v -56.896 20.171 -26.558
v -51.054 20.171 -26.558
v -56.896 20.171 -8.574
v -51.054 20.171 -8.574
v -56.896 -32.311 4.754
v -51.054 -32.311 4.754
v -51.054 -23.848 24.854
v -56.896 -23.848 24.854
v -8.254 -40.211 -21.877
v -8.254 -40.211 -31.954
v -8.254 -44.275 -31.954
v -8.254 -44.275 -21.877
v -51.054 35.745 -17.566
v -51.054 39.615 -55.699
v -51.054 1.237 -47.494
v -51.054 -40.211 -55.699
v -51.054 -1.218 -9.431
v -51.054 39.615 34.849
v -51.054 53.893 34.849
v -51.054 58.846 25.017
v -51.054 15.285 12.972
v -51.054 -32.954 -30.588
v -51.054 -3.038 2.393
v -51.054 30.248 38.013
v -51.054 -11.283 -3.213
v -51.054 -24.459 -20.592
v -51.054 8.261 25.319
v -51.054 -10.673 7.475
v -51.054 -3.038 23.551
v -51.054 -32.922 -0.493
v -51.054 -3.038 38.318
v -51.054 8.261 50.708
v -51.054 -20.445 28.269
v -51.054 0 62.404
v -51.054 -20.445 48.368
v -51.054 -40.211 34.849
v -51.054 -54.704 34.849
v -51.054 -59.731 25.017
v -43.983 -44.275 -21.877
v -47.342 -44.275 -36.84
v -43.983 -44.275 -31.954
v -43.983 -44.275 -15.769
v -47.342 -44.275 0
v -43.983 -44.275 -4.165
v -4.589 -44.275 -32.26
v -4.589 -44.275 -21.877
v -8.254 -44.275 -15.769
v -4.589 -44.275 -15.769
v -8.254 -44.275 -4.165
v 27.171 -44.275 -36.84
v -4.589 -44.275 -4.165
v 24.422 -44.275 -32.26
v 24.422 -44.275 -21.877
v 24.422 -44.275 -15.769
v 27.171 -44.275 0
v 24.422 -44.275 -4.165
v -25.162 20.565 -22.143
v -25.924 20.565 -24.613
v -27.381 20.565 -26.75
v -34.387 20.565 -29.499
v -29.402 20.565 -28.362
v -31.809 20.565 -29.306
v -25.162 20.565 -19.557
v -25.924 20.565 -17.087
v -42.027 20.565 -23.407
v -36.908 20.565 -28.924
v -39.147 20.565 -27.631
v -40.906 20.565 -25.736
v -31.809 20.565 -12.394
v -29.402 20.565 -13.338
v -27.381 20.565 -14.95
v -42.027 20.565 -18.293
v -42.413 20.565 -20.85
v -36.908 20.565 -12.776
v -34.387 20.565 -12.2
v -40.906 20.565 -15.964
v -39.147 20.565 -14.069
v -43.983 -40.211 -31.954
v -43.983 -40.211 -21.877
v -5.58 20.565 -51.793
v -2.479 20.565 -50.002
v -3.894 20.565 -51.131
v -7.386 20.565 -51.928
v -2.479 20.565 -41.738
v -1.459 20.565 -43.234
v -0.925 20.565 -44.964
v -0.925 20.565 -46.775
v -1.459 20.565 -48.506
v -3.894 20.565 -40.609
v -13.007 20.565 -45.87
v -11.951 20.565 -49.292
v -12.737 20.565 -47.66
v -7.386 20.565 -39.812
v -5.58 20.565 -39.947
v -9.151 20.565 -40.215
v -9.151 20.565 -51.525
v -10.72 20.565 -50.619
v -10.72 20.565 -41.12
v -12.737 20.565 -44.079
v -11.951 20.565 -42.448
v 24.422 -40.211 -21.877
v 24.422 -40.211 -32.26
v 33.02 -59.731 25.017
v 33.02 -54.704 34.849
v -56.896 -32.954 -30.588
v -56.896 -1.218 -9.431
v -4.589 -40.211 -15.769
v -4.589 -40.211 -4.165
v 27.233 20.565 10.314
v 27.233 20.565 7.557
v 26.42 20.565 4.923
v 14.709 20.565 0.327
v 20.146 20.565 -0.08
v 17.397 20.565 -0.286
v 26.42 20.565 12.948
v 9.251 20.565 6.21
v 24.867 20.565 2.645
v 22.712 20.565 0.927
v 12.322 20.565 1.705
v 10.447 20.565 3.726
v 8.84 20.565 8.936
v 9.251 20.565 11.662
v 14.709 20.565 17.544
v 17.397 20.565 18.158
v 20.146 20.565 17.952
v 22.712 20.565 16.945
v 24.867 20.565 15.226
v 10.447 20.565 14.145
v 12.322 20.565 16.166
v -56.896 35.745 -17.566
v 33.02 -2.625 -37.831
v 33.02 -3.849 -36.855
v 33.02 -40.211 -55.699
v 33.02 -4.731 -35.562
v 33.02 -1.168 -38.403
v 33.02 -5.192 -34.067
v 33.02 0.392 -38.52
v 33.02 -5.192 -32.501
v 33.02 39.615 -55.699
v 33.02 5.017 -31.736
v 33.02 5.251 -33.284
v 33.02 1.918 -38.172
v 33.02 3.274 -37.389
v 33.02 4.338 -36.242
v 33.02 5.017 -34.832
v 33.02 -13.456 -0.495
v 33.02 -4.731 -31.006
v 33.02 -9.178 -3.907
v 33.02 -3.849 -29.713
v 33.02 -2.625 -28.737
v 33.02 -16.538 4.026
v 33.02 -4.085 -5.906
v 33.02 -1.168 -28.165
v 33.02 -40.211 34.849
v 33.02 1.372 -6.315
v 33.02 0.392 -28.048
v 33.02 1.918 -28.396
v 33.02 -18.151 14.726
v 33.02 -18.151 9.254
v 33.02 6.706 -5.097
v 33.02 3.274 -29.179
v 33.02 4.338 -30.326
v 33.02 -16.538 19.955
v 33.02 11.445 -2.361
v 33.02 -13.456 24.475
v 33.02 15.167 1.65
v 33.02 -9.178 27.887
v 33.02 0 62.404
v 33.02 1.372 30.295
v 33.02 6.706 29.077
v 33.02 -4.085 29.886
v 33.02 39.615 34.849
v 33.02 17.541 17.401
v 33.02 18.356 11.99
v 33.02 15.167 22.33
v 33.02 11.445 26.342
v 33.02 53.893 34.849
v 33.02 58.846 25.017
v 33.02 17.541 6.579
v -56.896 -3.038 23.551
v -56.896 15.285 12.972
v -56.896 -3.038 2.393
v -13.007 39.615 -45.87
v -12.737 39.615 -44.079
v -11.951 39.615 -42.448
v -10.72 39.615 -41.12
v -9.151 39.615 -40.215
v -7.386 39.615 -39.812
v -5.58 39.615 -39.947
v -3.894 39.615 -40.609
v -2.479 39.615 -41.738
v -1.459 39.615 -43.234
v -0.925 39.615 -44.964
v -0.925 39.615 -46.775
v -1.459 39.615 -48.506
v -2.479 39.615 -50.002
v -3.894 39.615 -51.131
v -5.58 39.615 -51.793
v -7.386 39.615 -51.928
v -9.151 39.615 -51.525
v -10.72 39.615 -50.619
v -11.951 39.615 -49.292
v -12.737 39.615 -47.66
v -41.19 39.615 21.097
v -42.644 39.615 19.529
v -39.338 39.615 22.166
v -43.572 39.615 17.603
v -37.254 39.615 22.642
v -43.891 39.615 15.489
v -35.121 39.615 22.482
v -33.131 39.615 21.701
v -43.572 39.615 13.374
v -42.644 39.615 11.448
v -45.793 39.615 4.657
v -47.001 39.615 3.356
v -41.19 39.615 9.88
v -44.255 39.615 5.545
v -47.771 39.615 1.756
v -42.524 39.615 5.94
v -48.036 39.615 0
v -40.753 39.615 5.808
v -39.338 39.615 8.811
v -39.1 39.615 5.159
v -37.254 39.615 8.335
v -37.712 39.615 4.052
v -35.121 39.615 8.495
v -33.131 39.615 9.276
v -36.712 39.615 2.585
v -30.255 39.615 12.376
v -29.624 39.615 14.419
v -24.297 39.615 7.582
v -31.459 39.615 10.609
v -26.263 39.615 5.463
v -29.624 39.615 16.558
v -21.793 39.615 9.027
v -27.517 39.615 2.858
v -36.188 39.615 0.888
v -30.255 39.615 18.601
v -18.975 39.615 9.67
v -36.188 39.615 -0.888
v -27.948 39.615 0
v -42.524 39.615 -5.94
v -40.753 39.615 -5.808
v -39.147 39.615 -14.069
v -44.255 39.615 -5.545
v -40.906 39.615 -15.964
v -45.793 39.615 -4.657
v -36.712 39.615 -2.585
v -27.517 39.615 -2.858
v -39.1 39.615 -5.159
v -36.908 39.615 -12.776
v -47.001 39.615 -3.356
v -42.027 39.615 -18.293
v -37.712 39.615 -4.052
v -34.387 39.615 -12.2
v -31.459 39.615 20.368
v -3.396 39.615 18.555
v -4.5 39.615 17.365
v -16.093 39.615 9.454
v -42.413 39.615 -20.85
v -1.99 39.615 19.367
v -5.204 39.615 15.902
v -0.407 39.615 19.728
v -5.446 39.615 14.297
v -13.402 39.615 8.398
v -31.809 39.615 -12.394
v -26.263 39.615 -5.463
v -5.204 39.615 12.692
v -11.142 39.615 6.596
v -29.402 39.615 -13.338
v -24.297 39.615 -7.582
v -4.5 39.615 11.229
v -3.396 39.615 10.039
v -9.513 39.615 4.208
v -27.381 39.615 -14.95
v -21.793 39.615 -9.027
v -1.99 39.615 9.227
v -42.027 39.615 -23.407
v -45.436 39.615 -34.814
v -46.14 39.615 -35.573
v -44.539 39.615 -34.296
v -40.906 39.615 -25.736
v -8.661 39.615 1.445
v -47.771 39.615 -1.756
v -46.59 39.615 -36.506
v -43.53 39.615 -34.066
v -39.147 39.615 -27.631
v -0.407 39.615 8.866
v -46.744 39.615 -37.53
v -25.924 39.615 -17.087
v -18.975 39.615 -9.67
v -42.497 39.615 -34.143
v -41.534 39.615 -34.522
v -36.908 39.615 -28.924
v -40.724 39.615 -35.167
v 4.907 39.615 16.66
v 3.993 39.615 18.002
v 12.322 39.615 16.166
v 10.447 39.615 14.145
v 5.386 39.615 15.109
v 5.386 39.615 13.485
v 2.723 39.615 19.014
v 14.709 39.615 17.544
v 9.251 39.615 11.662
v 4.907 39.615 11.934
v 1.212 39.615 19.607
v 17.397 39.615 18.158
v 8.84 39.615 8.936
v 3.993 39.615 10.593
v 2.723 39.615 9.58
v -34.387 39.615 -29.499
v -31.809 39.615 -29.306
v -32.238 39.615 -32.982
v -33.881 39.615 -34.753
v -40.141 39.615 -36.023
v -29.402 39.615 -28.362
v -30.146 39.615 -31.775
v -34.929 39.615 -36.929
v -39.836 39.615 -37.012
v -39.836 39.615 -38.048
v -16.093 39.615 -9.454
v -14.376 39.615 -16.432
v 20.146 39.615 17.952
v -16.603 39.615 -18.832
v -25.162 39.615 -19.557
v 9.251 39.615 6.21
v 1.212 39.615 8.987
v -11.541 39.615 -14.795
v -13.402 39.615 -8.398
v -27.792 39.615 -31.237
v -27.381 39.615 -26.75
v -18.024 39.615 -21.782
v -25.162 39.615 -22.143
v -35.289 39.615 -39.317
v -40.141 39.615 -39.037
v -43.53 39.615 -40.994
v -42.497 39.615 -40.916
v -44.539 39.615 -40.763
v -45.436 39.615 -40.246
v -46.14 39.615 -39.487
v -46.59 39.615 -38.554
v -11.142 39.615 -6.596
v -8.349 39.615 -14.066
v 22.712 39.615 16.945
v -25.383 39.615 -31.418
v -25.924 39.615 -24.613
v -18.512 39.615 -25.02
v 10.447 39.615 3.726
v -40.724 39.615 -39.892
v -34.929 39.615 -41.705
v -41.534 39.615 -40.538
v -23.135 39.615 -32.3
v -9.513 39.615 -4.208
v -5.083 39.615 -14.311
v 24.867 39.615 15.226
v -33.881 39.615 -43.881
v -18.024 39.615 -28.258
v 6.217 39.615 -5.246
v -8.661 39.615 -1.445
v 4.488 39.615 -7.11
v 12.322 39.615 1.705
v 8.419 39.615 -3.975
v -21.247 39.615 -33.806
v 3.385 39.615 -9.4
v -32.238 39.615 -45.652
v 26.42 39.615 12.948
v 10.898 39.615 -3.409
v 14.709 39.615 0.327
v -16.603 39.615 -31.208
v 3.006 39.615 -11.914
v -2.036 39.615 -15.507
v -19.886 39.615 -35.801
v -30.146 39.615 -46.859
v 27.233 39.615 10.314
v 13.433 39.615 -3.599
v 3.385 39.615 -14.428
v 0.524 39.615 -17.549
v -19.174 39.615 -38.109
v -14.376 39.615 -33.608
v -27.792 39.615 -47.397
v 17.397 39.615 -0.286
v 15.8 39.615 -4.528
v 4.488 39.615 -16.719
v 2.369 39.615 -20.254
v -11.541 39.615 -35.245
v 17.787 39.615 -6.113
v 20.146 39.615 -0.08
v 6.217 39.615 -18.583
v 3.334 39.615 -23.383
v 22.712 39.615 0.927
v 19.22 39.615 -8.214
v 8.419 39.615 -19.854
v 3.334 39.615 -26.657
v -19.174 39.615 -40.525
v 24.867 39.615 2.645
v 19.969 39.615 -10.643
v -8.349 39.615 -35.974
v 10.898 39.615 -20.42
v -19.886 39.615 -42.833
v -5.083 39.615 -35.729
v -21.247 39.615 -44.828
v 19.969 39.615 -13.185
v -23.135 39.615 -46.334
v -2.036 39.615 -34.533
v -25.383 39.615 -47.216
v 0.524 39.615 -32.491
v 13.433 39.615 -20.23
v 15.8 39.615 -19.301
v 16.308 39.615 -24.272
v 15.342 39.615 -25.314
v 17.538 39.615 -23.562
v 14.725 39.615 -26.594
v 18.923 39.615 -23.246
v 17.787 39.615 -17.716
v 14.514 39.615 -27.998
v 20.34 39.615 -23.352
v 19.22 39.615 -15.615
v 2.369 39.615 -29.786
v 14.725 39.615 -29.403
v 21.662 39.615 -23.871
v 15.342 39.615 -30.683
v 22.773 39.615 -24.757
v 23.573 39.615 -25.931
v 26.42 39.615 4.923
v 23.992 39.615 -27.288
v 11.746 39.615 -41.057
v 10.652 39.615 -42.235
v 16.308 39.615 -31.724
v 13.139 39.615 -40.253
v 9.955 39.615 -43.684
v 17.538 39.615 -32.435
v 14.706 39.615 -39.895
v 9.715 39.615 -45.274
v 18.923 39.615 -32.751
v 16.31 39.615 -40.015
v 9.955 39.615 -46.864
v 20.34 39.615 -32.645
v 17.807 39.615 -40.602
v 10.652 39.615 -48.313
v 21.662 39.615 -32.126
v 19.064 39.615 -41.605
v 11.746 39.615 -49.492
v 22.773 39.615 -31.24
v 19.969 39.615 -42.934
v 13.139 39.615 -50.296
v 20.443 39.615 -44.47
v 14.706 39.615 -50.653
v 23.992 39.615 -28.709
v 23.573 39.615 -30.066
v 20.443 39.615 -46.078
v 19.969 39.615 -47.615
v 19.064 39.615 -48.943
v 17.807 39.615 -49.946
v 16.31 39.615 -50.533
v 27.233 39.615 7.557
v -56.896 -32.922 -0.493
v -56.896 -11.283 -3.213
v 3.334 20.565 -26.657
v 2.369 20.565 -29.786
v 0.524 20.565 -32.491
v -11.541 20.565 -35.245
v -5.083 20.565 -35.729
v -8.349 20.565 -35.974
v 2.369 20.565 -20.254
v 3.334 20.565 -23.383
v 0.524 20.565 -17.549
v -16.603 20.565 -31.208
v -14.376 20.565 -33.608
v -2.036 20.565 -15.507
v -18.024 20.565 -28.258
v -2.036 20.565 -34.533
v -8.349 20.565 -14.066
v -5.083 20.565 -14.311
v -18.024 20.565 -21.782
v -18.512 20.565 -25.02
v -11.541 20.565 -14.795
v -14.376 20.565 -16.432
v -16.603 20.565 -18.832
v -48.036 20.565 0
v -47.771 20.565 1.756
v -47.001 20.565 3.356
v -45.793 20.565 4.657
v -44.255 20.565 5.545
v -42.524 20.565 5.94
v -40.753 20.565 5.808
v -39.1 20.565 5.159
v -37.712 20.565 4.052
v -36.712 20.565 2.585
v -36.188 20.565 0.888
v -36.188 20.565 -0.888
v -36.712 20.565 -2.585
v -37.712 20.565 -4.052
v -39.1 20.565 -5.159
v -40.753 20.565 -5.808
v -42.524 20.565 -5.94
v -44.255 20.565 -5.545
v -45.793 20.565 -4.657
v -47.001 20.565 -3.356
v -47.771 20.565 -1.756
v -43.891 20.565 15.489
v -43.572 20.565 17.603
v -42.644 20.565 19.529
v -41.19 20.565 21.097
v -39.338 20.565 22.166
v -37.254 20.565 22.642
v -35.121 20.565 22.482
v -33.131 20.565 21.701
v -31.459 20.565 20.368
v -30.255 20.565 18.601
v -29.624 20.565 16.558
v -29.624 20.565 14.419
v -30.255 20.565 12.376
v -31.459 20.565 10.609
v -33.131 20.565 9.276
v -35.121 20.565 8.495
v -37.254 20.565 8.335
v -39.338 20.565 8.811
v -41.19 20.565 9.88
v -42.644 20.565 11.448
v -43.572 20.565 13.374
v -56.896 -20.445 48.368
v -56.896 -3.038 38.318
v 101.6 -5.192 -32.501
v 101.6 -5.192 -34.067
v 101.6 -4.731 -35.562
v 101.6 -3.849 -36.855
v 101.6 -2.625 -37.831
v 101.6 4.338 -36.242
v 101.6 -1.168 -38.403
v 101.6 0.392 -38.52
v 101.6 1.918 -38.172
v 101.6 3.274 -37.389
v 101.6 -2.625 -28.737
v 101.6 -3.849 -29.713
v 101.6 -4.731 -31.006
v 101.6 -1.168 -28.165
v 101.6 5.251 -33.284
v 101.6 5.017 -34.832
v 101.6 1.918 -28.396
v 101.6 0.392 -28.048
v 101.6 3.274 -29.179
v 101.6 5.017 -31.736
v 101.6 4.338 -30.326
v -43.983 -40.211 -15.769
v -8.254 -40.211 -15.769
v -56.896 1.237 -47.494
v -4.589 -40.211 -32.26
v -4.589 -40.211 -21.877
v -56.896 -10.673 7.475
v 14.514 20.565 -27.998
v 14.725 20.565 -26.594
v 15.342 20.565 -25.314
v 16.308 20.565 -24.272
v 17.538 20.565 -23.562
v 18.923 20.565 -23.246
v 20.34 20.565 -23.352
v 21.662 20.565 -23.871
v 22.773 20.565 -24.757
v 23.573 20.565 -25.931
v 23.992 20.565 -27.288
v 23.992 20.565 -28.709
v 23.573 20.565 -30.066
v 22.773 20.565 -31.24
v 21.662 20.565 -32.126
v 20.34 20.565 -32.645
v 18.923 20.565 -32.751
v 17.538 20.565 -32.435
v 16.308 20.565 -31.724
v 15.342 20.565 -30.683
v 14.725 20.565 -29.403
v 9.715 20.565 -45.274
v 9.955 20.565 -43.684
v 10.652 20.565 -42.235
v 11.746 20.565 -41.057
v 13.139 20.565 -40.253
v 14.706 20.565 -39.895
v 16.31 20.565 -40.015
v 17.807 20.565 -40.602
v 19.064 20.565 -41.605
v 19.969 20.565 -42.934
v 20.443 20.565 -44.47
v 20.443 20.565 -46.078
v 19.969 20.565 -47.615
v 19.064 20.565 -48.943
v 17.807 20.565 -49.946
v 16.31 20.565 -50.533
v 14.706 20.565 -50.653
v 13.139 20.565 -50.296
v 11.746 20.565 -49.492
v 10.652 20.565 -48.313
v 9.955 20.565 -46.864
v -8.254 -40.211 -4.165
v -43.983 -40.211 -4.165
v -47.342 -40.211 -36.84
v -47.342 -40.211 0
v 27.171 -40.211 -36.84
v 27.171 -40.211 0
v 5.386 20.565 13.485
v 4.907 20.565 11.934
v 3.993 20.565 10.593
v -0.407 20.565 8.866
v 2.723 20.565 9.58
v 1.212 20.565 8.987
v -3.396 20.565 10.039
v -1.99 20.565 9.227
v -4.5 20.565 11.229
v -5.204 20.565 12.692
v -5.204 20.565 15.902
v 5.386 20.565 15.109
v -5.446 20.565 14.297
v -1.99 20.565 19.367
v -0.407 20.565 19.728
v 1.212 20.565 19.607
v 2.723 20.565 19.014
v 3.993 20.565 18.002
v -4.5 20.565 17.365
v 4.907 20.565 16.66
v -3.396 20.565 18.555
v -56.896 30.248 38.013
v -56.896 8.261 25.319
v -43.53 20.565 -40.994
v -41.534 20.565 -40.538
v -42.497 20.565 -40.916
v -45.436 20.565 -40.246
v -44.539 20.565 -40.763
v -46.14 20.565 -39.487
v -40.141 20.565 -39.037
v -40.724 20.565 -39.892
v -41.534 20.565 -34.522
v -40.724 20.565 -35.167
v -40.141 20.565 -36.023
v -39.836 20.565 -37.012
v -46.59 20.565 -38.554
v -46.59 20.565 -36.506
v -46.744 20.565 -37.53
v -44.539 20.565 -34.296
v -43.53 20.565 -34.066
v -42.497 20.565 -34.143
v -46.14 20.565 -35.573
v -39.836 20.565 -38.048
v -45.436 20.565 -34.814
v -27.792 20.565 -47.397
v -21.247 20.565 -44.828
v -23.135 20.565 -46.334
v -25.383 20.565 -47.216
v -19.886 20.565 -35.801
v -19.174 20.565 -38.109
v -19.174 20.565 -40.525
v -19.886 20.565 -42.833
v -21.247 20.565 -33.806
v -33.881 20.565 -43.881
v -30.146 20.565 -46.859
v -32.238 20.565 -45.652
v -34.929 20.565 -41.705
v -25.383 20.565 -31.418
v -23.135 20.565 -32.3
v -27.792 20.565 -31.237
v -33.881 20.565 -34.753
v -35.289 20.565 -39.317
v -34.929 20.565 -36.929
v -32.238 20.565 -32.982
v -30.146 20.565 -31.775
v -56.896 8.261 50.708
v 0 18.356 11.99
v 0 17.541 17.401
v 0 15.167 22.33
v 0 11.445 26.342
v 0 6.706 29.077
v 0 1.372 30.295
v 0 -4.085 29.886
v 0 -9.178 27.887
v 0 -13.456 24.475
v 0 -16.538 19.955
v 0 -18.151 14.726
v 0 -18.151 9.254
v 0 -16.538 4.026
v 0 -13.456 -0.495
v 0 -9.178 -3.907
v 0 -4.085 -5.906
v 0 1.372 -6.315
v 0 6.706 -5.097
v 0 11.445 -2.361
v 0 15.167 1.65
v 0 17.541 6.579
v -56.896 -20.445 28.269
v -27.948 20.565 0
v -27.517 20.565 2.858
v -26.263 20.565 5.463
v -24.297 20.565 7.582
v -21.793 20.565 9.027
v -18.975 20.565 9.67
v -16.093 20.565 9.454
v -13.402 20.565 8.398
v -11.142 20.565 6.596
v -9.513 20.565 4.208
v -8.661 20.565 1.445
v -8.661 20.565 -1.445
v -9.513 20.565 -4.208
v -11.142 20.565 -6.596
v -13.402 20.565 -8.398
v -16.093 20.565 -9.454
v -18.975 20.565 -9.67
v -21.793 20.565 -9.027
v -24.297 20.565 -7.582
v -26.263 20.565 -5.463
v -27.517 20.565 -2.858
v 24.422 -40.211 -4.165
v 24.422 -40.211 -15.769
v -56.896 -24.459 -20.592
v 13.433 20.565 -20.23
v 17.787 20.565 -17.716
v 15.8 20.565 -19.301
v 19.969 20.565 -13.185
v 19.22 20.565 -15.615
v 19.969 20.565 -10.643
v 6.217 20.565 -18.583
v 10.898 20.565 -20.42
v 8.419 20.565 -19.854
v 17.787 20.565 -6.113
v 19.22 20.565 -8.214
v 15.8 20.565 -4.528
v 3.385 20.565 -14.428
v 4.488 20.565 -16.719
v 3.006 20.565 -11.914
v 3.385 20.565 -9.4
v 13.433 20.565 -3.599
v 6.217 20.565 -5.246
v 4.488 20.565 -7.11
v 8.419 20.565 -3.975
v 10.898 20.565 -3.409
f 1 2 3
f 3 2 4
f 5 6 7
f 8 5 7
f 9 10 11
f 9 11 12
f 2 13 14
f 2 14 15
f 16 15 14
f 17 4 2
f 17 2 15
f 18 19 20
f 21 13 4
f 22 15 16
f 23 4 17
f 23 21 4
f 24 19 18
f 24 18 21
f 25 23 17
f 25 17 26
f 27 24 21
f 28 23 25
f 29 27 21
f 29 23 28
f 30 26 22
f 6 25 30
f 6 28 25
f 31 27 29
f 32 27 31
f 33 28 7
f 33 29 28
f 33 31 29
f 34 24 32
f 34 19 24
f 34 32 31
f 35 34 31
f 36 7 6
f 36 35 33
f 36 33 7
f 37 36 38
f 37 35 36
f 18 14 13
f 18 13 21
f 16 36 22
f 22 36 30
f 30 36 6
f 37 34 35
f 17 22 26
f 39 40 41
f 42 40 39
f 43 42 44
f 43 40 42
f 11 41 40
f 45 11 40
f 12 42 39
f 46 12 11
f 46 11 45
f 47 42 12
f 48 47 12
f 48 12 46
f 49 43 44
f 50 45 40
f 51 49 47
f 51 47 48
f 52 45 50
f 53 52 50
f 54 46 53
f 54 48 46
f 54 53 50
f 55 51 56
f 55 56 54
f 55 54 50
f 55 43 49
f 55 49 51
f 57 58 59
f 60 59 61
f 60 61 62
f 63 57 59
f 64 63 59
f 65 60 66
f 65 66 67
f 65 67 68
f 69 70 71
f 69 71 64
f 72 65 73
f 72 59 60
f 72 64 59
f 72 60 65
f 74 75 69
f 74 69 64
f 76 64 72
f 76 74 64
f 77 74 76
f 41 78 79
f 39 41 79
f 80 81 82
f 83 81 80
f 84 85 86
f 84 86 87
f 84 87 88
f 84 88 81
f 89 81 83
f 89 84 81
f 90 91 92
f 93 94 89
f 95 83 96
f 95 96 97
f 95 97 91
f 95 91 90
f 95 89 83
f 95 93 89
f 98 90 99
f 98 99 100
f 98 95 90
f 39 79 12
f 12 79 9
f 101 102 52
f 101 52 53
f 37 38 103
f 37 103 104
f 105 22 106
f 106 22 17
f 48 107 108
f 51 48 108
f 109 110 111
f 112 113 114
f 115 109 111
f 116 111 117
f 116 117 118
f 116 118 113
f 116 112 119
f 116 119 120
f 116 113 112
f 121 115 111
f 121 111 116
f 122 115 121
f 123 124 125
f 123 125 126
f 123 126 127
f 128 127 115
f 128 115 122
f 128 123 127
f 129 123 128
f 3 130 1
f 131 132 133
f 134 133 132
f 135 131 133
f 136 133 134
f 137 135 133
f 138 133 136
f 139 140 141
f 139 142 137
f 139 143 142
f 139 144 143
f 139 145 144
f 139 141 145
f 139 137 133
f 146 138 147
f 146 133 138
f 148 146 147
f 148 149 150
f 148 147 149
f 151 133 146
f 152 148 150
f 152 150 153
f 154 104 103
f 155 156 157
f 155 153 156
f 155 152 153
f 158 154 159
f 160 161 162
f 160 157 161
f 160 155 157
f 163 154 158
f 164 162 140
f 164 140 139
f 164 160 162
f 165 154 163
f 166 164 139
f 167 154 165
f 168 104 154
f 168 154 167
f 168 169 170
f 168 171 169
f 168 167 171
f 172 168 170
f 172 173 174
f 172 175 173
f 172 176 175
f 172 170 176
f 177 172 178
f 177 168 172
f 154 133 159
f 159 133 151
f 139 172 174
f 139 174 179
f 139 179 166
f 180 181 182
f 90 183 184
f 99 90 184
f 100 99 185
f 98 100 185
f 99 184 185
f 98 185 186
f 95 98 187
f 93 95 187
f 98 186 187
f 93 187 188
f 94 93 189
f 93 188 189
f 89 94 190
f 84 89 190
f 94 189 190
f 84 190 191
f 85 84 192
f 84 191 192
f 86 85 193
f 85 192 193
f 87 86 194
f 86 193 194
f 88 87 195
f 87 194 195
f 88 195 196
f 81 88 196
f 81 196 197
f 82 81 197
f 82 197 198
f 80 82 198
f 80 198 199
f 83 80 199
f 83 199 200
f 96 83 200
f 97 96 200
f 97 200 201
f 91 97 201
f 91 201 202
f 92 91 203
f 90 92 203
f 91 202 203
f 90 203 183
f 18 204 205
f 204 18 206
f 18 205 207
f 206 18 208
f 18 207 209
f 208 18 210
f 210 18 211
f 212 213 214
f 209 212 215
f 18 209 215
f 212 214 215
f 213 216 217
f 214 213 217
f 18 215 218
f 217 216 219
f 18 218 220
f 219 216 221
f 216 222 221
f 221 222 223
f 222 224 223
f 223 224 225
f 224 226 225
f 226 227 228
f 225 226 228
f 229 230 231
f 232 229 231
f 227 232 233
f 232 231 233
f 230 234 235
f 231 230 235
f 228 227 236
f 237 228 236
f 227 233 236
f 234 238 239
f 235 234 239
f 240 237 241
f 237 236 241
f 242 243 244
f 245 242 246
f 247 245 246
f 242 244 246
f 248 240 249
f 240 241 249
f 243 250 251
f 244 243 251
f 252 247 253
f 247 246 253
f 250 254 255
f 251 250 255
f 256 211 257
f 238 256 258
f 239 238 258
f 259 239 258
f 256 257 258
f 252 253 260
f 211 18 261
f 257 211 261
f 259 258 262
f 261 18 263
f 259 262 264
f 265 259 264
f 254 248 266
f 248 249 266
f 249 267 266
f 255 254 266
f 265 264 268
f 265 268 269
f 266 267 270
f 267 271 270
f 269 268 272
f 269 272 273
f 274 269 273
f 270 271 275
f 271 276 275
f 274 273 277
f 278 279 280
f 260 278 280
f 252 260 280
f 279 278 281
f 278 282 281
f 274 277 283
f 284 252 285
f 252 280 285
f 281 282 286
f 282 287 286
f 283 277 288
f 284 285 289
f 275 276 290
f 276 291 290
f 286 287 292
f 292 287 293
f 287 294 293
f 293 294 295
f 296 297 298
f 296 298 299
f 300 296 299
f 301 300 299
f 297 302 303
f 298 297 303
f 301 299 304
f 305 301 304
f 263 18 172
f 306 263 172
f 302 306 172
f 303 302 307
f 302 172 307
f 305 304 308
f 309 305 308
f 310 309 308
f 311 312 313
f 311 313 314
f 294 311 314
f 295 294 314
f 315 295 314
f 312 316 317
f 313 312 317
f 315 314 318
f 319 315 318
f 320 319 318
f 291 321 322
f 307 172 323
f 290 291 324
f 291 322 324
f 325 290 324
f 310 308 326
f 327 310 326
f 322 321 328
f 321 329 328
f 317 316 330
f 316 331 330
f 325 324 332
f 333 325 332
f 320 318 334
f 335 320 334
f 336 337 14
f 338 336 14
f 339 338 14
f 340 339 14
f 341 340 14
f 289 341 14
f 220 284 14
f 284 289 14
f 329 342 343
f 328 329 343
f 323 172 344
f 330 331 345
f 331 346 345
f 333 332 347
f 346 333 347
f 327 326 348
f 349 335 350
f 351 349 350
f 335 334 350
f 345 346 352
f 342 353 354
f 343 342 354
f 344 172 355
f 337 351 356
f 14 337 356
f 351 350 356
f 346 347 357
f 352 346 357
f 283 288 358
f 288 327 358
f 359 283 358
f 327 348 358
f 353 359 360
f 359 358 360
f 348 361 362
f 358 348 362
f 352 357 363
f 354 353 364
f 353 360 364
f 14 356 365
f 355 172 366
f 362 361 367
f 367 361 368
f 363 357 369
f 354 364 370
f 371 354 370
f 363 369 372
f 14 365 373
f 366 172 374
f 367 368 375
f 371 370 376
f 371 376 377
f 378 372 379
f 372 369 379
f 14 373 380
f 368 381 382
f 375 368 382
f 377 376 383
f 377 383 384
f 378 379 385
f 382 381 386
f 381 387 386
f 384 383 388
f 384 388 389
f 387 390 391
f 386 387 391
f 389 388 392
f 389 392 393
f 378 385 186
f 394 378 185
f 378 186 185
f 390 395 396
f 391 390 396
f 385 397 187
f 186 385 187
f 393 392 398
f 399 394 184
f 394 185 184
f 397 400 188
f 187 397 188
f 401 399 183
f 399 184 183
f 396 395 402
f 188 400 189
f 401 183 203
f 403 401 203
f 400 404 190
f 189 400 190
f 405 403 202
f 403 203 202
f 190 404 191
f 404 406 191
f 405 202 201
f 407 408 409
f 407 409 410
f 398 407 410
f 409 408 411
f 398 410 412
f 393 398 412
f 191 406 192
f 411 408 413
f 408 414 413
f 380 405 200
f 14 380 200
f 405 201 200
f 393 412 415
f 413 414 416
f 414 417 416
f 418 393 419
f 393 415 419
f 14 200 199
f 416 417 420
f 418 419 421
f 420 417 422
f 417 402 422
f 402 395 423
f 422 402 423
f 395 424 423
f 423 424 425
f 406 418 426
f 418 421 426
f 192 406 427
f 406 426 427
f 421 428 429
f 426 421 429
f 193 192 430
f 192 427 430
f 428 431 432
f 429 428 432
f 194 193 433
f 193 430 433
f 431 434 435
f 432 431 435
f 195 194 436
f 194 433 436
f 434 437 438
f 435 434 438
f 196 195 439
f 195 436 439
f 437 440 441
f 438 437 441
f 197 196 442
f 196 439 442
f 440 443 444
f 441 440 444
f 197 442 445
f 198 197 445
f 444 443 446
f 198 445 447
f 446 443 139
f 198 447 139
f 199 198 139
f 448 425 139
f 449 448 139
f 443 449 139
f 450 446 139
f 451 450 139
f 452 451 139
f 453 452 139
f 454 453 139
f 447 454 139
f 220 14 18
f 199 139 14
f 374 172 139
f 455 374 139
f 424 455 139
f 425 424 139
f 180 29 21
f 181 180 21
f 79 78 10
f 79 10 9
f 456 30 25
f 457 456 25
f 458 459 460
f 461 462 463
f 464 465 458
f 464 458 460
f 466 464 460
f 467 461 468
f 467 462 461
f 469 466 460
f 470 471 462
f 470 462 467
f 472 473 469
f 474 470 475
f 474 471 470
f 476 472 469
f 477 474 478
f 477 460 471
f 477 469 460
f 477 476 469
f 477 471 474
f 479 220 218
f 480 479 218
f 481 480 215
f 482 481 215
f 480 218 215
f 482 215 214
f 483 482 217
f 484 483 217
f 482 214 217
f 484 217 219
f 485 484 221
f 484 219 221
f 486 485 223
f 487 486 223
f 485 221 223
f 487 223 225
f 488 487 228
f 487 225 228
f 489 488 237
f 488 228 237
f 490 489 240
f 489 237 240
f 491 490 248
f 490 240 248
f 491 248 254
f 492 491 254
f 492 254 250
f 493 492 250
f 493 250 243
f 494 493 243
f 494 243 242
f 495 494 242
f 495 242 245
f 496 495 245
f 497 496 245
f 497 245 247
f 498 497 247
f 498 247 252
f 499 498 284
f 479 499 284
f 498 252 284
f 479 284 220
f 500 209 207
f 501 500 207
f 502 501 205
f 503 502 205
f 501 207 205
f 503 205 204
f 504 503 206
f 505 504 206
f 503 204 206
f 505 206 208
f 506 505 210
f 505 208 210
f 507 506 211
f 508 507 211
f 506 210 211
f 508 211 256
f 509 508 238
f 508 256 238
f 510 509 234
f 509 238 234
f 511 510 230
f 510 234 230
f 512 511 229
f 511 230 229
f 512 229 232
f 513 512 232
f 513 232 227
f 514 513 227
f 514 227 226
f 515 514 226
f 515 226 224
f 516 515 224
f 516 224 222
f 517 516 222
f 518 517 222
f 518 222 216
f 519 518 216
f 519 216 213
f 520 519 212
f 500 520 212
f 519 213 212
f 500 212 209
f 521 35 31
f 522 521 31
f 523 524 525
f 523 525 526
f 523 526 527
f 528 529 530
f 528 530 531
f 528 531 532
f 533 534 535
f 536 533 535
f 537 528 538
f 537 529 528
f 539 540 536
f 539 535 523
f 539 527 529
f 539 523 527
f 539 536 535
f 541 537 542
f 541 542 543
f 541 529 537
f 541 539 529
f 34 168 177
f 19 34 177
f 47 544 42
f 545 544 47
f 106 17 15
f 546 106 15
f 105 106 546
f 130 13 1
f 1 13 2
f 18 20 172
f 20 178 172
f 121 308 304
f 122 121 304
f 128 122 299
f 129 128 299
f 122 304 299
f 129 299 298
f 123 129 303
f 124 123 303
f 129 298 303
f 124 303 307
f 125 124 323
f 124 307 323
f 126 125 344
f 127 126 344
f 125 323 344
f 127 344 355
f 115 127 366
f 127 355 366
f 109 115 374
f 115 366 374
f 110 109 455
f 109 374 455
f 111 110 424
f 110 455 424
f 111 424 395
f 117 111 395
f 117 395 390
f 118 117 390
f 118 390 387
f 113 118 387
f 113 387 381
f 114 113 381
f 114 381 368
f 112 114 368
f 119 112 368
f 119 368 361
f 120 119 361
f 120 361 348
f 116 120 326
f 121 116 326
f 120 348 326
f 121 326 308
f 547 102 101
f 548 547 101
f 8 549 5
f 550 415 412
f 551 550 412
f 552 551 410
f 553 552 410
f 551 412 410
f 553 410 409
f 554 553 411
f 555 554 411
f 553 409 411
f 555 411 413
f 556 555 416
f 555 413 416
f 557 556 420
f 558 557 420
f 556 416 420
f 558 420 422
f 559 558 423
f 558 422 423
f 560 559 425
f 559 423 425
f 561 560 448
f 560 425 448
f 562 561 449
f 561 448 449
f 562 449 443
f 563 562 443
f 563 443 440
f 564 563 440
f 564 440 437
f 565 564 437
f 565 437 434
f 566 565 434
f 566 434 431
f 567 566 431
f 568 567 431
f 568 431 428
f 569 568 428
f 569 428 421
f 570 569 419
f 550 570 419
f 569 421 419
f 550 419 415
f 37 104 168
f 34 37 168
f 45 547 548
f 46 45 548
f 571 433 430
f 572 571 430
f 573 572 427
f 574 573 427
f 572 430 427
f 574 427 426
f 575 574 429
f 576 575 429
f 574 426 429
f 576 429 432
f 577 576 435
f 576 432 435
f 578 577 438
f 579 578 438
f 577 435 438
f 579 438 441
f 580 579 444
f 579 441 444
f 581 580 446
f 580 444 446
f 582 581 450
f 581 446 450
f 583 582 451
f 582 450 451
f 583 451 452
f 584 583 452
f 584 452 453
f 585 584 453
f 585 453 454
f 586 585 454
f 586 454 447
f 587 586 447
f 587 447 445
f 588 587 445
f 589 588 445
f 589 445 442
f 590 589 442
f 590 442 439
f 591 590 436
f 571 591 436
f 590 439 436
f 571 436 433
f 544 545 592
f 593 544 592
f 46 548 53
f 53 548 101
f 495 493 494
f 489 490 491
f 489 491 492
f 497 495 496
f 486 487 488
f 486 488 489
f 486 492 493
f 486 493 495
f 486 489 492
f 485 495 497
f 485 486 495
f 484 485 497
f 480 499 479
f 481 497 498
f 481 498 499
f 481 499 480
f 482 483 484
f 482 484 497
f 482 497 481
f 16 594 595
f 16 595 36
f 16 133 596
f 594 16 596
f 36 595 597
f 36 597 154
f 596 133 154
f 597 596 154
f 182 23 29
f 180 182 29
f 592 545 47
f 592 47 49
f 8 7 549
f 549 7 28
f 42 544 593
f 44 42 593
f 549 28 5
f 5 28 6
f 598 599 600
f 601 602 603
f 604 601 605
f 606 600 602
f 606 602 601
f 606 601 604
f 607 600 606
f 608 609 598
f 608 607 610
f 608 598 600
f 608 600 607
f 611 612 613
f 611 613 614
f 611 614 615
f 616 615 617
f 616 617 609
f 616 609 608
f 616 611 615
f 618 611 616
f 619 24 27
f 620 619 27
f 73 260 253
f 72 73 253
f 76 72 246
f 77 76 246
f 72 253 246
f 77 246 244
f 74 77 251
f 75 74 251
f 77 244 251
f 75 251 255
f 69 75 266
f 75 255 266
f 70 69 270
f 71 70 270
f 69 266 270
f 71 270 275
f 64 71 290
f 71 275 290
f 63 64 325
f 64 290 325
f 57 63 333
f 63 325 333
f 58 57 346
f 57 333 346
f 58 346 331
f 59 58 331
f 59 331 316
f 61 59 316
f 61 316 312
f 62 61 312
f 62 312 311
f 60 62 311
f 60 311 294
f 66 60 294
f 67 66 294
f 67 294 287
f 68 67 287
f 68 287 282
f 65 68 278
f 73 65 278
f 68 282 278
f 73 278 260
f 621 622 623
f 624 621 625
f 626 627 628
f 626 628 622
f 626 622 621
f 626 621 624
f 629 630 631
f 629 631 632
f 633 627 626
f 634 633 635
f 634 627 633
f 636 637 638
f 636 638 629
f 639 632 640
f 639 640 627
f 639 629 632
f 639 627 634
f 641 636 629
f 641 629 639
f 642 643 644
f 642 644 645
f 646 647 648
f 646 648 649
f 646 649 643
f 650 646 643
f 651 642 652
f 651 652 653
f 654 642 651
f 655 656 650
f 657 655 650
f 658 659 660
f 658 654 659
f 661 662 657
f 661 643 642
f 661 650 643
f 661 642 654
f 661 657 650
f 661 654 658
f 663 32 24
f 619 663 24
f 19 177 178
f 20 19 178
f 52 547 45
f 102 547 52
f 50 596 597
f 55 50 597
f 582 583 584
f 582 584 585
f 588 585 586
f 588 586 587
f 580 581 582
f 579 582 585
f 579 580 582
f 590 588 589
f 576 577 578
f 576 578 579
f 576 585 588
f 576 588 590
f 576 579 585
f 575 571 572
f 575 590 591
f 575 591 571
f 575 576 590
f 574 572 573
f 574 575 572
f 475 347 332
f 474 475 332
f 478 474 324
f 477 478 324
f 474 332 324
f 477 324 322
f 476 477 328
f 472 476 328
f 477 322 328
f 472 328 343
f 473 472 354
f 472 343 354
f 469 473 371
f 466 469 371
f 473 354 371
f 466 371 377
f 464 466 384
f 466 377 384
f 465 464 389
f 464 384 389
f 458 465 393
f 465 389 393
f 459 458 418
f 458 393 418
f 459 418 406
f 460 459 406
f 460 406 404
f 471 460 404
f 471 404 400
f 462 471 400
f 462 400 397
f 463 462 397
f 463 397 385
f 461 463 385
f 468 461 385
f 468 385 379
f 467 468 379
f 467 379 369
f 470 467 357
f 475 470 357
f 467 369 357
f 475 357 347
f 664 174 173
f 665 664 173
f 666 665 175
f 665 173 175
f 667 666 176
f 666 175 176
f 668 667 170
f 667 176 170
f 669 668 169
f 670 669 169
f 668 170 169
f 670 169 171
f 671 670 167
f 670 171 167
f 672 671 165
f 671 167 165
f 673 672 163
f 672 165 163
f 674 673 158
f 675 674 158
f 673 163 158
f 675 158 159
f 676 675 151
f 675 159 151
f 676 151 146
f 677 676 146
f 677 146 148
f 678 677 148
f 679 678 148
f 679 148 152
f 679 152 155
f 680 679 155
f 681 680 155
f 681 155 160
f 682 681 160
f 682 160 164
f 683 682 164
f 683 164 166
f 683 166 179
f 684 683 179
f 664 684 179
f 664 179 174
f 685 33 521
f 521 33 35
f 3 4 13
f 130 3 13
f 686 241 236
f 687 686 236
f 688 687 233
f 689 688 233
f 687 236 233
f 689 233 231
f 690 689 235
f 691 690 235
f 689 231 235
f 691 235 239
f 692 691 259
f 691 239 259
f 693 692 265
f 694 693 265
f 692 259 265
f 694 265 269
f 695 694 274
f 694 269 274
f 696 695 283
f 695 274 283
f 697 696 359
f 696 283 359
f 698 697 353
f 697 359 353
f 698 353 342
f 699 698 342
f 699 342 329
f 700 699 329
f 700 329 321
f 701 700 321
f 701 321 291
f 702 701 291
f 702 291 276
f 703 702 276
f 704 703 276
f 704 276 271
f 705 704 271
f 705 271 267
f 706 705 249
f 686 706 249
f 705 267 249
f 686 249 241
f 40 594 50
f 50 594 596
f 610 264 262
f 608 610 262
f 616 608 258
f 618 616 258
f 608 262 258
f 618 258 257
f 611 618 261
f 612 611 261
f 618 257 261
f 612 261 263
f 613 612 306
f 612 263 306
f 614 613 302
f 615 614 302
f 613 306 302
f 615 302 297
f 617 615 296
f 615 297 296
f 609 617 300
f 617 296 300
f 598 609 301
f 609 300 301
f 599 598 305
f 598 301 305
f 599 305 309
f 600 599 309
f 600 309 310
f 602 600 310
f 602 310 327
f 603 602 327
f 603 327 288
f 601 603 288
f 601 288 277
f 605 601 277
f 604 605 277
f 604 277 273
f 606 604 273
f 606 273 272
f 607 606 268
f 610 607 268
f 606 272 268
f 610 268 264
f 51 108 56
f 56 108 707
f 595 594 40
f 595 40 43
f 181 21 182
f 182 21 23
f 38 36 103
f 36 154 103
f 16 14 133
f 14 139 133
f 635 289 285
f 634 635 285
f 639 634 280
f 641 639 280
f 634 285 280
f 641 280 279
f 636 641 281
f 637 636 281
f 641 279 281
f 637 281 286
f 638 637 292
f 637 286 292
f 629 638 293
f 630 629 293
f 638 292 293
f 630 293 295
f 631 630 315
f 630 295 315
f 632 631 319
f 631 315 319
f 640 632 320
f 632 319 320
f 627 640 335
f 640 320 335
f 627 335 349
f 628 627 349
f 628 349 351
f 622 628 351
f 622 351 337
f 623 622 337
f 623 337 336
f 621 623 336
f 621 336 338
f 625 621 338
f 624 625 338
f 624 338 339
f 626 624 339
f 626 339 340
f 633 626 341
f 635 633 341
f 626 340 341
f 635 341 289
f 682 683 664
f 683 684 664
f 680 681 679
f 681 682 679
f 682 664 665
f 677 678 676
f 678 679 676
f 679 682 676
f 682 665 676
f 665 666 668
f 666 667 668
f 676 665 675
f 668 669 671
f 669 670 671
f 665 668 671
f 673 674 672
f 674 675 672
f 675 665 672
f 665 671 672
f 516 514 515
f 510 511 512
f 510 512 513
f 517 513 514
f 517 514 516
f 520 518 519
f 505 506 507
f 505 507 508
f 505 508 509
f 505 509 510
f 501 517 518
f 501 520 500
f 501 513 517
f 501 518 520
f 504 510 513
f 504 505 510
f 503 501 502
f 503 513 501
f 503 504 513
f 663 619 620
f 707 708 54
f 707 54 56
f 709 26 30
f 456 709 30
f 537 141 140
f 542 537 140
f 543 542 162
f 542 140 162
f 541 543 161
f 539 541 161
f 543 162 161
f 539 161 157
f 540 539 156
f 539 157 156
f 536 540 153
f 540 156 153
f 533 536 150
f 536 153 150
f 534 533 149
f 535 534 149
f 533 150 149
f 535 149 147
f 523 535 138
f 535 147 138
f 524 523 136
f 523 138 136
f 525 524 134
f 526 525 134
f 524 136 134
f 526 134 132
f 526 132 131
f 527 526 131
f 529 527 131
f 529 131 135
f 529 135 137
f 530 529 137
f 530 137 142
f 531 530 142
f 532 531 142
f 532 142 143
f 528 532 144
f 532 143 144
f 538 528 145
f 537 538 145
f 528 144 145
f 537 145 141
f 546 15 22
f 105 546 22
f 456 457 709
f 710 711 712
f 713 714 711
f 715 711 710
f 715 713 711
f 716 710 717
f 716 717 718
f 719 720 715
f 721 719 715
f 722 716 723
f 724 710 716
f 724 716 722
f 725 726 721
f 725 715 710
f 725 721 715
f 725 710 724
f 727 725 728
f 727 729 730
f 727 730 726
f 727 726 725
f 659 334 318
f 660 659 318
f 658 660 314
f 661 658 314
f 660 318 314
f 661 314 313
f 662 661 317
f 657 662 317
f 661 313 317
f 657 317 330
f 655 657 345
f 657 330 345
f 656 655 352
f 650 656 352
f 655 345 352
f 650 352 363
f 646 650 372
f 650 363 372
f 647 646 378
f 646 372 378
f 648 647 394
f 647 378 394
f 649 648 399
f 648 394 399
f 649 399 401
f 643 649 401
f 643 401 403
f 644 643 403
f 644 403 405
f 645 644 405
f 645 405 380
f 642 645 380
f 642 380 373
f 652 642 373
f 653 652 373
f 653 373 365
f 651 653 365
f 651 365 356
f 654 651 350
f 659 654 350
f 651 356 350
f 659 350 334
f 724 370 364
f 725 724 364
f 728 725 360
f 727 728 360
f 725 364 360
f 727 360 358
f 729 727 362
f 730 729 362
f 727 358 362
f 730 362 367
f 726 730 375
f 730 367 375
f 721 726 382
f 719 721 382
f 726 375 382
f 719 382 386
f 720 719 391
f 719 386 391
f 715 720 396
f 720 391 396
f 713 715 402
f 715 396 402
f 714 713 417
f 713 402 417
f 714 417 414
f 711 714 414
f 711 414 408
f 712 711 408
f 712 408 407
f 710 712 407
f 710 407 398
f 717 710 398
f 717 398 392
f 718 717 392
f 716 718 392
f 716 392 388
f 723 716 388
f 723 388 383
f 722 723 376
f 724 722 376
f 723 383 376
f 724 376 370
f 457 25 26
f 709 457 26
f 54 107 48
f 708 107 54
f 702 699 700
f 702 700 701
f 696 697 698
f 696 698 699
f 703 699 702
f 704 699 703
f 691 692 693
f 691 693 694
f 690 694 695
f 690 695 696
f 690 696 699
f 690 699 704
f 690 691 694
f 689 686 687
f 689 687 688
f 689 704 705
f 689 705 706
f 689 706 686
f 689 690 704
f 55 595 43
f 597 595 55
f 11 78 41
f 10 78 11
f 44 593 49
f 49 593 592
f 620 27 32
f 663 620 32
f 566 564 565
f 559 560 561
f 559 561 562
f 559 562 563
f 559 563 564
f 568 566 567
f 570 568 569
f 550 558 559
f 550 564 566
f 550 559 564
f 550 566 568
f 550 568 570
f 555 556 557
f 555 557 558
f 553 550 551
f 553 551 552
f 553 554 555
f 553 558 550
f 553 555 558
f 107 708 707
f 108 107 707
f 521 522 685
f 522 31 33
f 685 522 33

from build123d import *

# Parameters (mm, degrees)
F1_DEPTH  = 33.02
F2_R      = 18.3561977424
F3_DEPTH  = 38.1
F4_R      = 5.2507259391
F5_DEPTH  = 68.58
F7_DEPTH  = 51.054
F8_R      = 4.7656912357
F8_R_2    = 10.9843884843
F8_R_3    = 9.697479166
F8_R_4    = 9.2479292762
F8_R_5    = 8.5292895708
F8_R_6    = 7.1733155085
F8_R_7    = 8.6736896771
F8_R_8    = 5.4464276584
F8_R_9    = 8.102554369
F8_R_10   = 5.3943968671
F8_R_11   = 6.0751011196
F8_R_12   = 5.9571165591
F8_R_13   = 3.4735651016
F9_DEPTH  = 19.05
F11_W     = 74.5131336153
F11_H     = 36.8404686451
F11_W_2   = 35.7296550646
F11_H_2   = 10.0775975734
F11_W_3   = 29.0112560615
F11_H_3   = 10.3829782456
F11_H_4   = 11.6045051254
F12_DEPTH = 4.064
F14_DEPTH = 5.842


with BuildPart() as f1:
    # F0 (on Right) → F1 (new body)
    with BuildSketch(Plane.YZ):
        Polygon((0, 55.1033206284), (-40.2105264366, 34.8491296172), (-40.2105264366, -55.6990355253), (39.6148264408, -55.6990355253), (39.6148264408, 34.8491296172), align=None)
        Polygon((-59.7306484823, 25.0167718862), (-40.2105264366, 34.8491296172), (0, 55.1033206284), (39.6148264408, 34.8491296172), (58.8457670794, 25.0167718862), (53.8931720944, 34.8491296172), (0, 62.4035252784), (-54.703579845, 34.8491296172), align=None)
    extrude(amount=F1_DEPTH)

    # F2 (on face) → F3 (cut)
    with BuildSketch(Plane.YZ.offset(33.02)):
        with Locations((0, 11.9900638238)):
            Circle(F2_R)
    extrude(amount=-F3_DEPTH, mode=Mode.SUBTRACT)

    # F4 (on face) → F5 (join)
    with BuildSketch(Plane.YZ.offset(33.02)):
        with Locations((0, -33.2840159535)):
            Circle(F4_R)
    extrude(amount=F5_DEPTH)

    # F6 (on face) → F7 (join)
    with BuildSketch(Plane(origin=(0, 0, 0), x_dir=(0, -1, 0), z_dir=(-1, 0, 0))):
        Polygon((-53.8931720944, 34.8491296172), (-58.8457670794, 25.0167718862), (-39.6148264408, 34.8491296172), (-39.6148264408, -55.6990355253), (40.2105264366, -55.6990355253), (40.2105264366, 34.8491296172), (59.7306484823, 25.0167718862), (54.703579845, 34.8491296172), (0, 62.4035252784), align=None)
    extrude(amount=F7_DEPTH)

    # F8 (on face) → F9 (cut)
    with BuildSketch(Plane(origin=(0, 39.6148264408, 0), x_dir=(-1, 0, 0), z_dir=(0, 1, 0))):
        with Locations((-19.2792955786, -27.9984436929)):
            Circle(F8_R)
        with Locations((7.5277197175, -25.0198859721)):
            Circle(F8_R_2)
        with Locations((18.2505380362, 0)):
            Circle(F8_R_3)
        with Locations((-18.0878732353, 8.9356740937)):
            Circle(F8_R_4)
        with Locations((-11.5350466222, -11.9142318144)):
            Circle(F8_R_5)
        with Locations((36.7175936699, 15.4885025695)):
            Circle(F8_R_6)
        with Locations((33.7390340865, -20.8499059081)):
            Circle(F8_R_7)
        with Locations((0, 14.2970783636)):
            Circle(F8_R_8)
        with Locations((27.1862093359, -39.3169634044)):
            Circle(F8_R_9)
        with Locations((-15.1093155146, -45.2740825713)):
            Circle(F8_R_10)
        with Locations((6.9320080802, -45.8697937429)):
            Circle(F8_R_11)
        with Locations((42.0789942145, 0)):
            Circle(F8_R_12)
        with Locations((43.2704202831, -37.5298298895)):
            Circle(F8_R_13)
    extrude(amount=-F9_DEPTH, mode=Mode.SUBTRACT)

    # F11 (on face) → F12 (join)
    with BuildSketch(Plane.XZ.offset(40.2105264366)):
        with Locations((-10.0858341902, -18.4202343225)):
            Rectangle(F11_W, F11_H)
        with Locations((-26.1183748953, -26.9155642018)):
            Rectangle(F11_W_2, F11_H_2, mode=Mode.SUBTRACT)
        with Locations((9.9166636355, -27.0682545379)):
            Rectangle(F11_W_3, F11_H_3, mode=Mode.SUBTRACT)
        with Locations((-26.1183748953, -9.9668807816)):
            Rectangle(F11_W_2, F11_H_4, mode=Mode.SUBTRACT)
        with Locations((9.9166636355, -9.9668807816)):
            Rectangle(F11_W_3, F11_H_4, mode=Mode.SUBTRACT)
    extrude(amount=F12_DEPTH)

    # F13 (on face) → F14 (join)
    with BuildSketch(Plane(origin=(-51.054, 0, 0), x_dir=(0, -1, 0), z_dir=(-1, 0, 0))):
        Polygon((3.0381854158, 2.3930334493), (3.0381854158, 23.5505028621), (-15.2847205754, 12.9717681557), align=None)
        Polygon((-8.2609392703, 25.3185906107), (-8.2609392703, 50.7075435822), (-30.248417519, 38.0130670965), align=None)
        Polygon((32.9538357962, -30.5881882396), (1.2176486146, -9.4307204399), (-1.2371623889, -47.4937986583), align=None)
        Polygon((32.310971557, 4.7542667825), (23.8479883086, 24.8538487713), (10.672731325, 7.474899292), align=None)
        Polygon((-20.1708246022, -26.5583209633), (-20.1708246022, -8.5744783342), (-35.7452891767, -17.5663996488), align=None)
        Polygon((20.4449407756, 28.2686487088), (20.4449407756, 48.3682468286), (3.038178198, 38.3184477687), align=None)
        Polygon((24.4587499026, -20.5924118991), (32.9217363772, -0.4928299103), (11.2834945321, -3.2134596258), align=None)
    extrude(amount=F14_DEPTH)


solid = f1.part
